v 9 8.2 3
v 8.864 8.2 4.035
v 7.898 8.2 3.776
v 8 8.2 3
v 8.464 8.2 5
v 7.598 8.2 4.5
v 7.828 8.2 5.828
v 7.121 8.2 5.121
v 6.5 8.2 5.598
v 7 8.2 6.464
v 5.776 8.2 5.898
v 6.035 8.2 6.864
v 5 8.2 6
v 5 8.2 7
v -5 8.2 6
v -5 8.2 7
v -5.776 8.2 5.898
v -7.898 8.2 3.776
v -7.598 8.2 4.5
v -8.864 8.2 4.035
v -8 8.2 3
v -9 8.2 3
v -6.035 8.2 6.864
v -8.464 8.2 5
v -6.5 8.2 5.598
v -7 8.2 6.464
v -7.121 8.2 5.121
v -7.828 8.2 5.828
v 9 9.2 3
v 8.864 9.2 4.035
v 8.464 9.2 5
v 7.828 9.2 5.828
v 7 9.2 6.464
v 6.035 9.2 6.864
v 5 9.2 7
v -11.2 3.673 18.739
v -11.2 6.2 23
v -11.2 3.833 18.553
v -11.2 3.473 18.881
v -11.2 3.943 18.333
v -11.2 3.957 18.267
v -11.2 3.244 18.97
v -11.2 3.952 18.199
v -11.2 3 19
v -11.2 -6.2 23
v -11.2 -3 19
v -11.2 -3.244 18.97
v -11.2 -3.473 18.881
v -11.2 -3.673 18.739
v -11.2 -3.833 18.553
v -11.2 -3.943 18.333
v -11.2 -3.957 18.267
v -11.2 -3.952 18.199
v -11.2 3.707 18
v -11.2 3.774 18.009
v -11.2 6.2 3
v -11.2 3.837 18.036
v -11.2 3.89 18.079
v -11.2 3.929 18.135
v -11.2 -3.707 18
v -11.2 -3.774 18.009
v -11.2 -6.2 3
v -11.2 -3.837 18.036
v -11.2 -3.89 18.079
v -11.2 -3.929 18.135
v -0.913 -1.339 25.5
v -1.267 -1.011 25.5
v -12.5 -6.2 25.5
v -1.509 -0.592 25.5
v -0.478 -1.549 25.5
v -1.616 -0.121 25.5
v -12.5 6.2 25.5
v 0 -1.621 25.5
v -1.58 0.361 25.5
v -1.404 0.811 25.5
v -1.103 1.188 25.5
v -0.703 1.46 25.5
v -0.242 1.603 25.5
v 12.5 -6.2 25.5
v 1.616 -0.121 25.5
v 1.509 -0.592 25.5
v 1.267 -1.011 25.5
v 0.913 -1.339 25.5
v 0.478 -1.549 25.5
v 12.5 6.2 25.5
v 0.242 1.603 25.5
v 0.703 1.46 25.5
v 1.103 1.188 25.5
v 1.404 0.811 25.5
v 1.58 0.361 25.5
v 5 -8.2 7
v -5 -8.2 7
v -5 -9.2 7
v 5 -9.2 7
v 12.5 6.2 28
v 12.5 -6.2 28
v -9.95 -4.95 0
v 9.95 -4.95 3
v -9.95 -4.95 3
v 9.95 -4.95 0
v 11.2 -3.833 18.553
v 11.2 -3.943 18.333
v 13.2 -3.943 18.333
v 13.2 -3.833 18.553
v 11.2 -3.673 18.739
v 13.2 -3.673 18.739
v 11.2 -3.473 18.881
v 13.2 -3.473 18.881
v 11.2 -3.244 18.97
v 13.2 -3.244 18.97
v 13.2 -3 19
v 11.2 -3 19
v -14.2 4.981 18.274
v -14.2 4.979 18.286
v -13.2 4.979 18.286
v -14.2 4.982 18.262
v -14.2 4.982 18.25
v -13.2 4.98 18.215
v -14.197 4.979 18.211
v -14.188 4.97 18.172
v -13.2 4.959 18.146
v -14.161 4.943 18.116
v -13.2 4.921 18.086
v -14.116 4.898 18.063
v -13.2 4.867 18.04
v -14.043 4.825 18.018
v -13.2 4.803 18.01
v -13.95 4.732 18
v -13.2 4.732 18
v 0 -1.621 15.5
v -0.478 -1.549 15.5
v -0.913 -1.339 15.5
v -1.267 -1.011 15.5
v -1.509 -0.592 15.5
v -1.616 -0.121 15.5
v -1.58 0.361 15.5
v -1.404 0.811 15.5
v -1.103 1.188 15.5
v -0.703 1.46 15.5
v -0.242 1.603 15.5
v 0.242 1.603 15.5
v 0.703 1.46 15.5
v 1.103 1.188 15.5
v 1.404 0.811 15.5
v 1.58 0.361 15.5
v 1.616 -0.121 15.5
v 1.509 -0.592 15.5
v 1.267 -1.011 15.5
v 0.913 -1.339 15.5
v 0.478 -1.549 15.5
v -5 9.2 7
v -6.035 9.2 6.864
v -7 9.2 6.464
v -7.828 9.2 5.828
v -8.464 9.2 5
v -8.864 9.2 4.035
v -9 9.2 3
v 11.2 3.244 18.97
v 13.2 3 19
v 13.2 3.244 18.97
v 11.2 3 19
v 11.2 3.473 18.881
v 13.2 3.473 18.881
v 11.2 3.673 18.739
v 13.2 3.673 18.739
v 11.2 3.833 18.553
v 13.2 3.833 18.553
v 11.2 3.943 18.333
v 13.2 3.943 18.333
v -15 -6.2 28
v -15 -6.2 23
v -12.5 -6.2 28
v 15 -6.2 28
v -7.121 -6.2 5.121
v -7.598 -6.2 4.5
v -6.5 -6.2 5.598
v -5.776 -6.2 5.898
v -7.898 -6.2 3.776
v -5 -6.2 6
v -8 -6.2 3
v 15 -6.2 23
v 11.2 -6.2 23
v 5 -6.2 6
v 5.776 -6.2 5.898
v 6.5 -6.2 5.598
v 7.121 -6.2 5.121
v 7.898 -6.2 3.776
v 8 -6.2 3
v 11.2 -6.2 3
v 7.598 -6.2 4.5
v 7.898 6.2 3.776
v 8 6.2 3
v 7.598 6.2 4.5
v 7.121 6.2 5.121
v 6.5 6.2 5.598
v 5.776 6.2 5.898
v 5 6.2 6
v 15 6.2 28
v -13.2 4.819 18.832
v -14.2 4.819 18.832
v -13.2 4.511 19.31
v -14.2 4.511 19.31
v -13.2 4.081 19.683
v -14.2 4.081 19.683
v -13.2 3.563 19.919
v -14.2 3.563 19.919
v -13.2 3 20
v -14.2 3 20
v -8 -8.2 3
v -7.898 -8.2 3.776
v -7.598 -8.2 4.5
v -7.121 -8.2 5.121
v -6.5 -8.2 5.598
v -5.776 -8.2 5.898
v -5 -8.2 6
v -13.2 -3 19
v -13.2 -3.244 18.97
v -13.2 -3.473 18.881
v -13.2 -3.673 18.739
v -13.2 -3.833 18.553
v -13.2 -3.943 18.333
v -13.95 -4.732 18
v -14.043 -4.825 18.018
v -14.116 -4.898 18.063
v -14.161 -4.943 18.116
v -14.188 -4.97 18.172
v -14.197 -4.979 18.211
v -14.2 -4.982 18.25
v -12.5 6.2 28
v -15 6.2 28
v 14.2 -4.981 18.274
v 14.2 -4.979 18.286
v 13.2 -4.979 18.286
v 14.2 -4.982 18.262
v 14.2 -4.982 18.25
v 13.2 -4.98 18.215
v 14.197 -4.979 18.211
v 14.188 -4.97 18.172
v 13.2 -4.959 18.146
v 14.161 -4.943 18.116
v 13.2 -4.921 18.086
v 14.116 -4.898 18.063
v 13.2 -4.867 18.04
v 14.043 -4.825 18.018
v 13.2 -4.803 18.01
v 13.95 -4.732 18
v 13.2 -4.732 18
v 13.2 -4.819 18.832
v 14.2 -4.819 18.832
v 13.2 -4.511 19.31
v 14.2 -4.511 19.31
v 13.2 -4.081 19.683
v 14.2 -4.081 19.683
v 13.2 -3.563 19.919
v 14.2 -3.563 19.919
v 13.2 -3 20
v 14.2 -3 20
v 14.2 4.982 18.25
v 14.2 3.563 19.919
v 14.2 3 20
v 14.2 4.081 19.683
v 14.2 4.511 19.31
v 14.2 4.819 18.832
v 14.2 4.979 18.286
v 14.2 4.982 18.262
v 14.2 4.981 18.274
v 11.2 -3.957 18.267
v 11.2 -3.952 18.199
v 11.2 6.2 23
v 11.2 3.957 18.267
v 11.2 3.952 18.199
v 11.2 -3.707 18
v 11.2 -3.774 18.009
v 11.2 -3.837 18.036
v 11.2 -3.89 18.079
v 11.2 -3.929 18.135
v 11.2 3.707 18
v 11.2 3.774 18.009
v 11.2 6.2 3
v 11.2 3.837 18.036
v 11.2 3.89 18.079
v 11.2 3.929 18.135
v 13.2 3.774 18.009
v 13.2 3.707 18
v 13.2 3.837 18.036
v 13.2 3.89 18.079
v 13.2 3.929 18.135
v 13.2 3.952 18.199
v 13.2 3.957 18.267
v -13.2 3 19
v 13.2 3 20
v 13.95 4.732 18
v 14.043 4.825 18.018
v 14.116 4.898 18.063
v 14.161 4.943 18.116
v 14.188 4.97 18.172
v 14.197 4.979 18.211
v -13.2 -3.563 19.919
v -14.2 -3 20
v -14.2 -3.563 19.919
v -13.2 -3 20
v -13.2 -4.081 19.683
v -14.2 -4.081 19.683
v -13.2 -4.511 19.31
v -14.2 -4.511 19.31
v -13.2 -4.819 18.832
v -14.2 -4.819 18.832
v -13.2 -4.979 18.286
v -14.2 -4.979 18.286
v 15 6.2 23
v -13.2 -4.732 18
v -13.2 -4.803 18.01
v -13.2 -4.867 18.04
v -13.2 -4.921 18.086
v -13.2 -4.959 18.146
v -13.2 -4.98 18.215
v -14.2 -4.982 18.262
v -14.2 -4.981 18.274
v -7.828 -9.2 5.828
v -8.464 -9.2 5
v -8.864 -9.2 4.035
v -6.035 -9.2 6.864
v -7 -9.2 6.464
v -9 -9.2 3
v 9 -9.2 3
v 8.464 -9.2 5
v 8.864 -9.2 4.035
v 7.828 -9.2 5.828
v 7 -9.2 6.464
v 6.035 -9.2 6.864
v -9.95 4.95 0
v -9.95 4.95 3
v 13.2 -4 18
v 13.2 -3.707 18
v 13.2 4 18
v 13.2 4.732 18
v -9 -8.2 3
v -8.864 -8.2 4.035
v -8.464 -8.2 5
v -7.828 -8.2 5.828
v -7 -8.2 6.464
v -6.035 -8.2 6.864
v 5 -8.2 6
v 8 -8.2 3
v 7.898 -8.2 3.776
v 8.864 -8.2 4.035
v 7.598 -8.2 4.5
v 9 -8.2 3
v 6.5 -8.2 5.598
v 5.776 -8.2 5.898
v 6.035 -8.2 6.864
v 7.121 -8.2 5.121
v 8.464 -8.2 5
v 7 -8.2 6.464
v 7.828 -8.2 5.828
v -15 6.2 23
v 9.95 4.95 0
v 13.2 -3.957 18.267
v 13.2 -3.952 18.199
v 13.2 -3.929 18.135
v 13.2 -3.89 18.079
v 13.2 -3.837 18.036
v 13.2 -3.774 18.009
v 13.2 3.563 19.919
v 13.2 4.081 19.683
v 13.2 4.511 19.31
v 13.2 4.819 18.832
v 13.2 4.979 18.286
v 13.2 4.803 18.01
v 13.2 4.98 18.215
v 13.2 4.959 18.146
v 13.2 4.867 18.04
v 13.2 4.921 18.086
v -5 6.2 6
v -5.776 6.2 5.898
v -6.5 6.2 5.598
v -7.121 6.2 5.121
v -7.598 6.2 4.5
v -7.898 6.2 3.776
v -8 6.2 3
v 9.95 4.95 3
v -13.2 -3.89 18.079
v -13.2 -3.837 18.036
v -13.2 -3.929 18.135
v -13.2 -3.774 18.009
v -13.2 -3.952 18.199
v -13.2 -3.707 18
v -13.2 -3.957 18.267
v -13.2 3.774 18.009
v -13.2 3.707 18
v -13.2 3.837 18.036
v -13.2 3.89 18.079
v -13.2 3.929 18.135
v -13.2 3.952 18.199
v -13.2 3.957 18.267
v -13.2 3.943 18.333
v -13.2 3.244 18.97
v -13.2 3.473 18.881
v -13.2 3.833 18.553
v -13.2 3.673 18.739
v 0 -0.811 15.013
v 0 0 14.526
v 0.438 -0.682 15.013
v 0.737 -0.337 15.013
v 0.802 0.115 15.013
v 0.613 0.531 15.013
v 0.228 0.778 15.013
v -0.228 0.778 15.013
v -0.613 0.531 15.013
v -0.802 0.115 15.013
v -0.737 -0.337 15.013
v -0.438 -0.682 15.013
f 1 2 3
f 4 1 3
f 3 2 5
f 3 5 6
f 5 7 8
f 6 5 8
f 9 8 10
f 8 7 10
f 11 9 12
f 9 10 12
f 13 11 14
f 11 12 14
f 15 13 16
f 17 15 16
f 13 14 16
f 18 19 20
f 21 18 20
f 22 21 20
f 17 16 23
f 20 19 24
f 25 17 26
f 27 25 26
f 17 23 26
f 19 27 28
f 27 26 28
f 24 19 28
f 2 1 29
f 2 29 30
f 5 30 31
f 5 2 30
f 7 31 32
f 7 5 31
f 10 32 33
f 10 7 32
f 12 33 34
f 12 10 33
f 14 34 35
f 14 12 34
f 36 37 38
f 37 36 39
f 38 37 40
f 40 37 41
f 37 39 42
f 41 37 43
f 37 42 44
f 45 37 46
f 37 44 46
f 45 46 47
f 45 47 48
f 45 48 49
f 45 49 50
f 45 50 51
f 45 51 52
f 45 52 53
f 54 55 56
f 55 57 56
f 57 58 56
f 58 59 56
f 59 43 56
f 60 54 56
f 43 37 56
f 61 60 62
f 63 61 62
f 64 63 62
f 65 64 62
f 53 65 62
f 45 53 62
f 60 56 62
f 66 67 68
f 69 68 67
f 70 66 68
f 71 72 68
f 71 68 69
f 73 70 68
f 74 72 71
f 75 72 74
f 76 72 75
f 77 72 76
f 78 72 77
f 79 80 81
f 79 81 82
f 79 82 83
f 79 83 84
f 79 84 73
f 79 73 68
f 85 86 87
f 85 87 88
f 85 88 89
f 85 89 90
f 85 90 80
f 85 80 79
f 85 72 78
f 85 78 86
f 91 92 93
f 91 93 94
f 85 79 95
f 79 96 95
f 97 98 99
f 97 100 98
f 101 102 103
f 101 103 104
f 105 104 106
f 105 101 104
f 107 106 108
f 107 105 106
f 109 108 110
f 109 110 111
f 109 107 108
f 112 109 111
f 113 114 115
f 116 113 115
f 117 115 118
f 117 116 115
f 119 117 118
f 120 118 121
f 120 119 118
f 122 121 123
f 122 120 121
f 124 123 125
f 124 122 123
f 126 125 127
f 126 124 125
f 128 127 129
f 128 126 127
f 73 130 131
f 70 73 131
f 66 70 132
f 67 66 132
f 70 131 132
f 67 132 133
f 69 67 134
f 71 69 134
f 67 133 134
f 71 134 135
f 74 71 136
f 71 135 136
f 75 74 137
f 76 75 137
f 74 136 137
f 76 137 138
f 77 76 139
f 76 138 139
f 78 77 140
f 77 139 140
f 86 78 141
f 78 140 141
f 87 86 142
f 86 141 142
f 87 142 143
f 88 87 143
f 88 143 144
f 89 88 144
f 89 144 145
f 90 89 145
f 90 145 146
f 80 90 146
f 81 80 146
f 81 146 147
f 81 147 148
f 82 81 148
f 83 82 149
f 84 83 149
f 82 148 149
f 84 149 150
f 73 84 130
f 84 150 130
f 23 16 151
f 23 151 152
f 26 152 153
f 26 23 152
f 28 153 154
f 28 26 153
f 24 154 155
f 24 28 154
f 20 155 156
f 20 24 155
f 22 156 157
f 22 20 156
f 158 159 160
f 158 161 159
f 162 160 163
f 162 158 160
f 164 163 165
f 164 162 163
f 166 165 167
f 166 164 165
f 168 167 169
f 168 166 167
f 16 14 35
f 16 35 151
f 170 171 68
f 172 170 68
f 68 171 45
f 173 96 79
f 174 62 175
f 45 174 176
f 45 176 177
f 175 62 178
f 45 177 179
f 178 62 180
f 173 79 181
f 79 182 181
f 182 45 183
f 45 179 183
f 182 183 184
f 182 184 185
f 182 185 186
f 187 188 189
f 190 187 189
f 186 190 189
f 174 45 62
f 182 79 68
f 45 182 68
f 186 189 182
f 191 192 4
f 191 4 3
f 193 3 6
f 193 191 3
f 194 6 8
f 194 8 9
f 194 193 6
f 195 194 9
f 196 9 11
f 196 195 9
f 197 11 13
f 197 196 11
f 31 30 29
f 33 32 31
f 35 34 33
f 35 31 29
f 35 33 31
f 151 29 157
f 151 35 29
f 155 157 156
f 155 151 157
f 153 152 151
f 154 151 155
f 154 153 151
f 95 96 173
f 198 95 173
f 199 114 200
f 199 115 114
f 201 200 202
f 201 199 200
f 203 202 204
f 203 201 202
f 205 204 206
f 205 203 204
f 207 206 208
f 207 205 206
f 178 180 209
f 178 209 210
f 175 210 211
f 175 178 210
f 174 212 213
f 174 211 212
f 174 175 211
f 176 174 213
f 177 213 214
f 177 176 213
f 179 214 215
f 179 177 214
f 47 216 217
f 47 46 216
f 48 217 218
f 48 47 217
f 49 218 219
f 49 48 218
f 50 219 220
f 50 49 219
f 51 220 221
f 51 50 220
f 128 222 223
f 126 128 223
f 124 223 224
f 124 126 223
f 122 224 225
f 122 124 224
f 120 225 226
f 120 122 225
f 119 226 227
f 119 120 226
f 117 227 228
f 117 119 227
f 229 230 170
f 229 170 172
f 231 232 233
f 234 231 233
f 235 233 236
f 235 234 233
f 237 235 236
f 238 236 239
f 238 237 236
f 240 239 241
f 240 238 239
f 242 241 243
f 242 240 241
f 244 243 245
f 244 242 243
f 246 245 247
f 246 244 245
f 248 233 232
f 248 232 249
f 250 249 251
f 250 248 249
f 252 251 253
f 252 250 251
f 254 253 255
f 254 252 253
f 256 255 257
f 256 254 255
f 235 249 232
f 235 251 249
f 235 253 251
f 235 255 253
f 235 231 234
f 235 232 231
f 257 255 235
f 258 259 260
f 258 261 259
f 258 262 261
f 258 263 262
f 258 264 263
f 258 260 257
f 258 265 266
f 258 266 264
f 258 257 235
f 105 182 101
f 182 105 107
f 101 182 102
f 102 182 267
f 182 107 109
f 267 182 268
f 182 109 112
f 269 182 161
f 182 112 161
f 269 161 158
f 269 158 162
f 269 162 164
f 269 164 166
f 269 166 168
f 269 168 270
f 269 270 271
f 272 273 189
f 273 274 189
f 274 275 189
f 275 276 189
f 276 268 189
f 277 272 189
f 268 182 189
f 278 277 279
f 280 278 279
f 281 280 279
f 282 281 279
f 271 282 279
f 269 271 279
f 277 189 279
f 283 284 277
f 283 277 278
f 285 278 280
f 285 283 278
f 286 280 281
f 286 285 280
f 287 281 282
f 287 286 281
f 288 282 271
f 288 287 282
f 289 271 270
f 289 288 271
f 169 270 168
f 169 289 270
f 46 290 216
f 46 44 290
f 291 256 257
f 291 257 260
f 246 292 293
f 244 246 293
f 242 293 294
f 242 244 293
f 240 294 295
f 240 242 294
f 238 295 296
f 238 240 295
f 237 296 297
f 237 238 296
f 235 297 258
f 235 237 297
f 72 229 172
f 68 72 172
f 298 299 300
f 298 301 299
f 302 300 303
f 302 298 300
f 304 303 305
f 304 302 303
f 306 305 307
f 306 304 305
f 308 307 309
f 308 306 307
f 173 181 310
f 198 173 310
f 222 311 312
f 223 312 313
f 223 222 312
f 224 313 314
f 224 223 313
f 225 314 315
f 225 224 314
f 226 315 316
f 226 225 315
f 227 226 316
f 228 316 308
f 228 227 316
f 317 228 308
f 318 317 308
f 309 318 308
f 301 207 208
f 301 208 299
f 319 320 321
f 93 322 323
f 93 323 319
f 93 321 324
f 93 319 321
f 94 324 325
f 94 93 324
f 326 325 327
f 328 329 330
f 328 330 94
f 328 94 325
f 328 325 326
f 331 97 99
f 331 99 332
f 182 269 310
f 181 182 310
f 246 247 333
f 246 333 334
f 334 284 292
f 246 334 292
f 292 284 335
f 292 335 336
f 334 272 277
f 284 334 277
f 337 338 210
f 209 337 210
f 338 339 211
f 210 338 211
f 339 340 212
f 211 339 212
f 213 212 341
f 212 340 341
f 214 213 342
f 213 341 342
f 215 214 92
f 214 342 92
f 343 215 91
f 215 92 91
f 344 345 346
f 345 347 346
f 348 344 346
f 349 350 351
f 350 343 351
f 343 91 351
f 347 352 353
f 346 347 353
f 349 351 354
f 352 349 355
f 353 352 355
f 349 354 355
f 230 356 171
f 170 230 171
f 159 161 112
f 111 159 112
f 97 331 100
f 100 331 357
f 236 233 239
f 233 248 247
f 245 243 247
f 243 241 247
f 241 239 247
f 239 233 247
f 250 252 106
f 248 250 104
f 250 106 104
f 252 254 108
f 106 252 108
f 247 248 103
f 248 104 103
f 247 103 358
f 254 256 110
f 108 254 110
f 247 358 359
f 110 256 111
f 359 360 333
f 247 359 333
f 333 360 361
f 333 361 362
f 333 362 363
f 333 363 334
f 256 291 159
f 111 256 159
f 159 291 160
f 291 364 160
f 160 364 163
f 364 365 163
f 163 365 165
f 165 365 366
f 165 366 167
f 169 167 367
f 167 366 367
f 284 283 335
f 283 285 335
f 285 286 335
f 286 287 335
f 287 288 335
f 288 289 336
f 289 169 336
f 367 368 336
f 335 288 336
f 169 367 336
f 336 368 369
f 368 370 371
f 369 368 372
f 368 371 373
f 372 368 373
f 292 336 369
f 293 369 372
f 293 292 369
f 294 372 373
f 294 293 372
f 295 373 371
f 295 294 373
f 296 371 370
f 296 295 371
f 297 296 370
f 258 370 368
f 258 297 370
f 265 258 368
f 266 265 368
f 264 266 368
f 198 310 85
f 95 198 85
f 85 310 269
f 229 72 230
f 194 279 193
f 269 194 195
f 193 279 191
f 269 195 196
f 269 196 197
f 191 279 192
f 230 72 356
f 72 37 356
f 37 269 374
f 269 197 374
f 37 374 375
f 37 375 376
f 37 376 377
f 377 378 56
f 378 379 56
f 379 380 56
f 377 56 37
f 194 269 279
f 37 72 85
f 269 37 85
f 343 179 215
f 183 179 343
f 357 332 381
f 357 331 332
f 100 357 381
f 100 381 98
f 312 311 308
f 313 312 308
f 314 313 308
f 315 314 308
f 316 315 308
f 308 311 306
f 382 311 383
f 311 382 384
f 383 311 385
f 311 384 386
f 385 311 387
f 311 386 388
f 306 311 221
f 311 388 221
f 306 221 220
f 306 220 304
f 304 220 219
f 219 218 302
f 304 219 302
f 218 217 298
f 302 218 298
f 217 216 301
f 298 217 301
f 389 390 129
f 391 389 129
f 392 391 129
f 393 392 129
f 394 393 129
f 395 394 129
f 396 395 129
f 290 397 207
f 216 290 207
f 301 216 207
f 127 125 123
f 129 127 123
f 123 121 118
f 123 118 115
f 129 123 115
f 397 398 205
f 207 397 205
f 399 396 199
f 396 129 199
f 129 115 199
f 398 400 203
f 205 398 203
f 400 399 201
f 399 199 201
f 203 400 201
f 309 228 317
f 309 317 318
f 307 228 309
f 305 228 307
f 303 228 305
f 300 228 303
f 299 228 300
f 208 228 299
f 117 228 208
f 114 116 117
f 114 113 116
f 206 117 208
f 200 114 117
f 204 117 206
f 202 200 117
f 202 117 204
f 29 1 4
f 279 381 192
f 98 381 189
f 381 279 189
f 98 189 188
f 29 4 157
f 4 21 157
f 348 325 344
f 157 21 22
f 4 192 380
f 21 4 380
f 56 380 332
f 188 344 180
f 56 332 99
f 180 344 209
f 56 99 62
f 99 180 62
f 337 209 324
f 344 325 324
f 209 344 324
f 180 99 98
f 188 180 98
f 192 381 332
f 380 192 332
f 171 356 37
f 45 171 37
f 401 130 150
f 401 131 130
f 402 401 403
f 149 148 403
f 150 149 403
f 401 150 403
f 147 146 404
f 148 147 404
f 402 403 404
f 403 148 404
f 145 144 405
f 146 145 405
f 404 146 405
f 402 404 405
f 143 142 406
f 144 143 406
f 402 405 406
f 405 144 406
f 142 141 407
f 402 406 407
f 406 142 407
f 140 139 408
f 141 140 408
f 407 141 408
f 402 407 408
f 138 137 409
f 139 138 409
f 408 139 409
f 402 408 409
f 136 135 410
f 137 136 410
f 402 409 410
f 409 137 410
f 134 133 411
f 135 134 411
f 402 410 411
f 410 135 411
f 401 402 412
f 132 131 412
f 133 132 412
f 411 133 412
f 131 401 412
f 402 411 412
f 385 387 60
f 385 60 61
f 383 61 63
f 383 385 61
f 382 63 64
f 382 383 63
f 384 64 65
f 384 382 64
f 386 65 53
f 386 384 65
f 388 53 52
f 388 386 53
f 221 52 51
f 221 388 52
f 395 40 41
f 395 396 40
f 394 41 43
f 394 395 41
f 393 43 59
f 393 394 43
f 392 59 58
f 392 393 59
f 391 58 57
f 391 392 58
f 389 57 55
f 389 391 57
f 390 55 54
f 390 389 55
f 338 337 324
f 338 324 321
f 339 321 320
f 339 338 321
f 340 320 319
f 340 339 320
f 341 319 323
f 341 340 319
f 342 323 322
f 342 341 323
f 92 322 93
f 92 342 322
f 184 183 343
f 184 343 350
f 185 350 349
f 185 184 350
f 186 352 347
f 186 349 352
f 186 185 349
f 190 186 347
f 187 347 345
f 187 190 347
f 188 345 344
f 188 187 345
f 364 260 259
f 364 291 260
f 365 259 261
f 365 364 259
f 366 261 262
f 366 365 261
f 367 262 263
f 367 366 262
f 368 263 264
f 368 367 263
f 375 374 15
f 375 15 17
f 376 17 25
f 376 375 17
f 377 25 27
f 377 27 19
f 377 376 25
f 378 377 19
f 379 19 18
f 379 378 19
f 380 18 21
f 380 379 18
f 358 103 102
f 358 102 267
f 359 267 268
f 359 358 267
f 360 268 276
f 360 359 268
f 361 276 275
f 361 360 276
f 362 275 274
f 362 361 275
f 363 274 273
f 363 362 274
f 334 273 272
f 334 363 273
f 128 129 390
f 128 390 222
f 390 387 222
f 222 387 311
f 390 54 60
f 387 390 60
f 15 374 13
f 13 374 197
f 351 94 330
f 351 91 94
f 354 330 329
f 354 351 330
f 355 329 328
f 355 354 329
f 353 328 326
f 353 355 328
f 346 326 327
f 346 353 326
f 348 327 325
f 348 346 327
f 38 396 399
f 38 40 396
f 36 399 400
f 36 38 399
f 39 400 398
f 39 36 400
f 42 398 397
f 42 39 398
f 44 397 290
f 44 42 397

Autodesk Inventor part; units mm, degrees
ref_plane "YZ Plane" through (0, 0, 0) normal (1, 0, 0) x (0, 1, 0)
sketch "Sketch1" plane through (0, 0, 0) normal (0, 0, 1) x (1, 0, 0)
  line L0 (0, 6.93) -> (0, -6.93) construction
  line L1 (-13.93, 0) -> (13.93, 0) construction
  line L2 (-9.95, 4.95) -> (9.95, 4.95)
  line L3 (9.95, 4.95) -> (9.95, -4.95)
  line L4 (9.95, -4.95) -> (-9.95, -4.95)
  line L5 (-9.95, -4.95) -> (-9.95, 4.95)
  point P0 (0, 0)
  dimension "d0" = 9.9
  dimension "d1" = 19.9
extrude "Extrusion1" add sketch "Sketch1" along normal blind 3
sketch "Sketch2" plane through (0, 0, 3) normal (0, 0, 1) x (1, 0, 0)
  line L0 (9.95, 4.95) -> (-9.95, 4.95) construction
  line L1 (-9.95, 4.95) -> (-9.95, -4.95) construction
  line L2 (-9.95, -4.95) -> (9.95, -4.95) construction
  line L3 (9.95, -4.95) -> (9.95, 4.95) construction
  line L4 (11.2, 6.2) -> (-11.2, 6.2)
  line L5 (-11.2, 6.2) -> (-11.2, -6.2)
  line L6 (-11.2, -6.2) -> (11.2, -6.2)
  line L7 (11.2, -6.2) -> (11.2, 6.2)
  point P0 (0, 0)
  dimension "d" = 1.25
  dimension "d5" = 1.25
  dimension "d6" = 1.25
  dimension "d7" = 1.25
extrude "Extrusion2" add sketch "Sketch2" along normal blind 20
sketch "Sketch3" plane through (0, 0, 23) normal (0, 0, 1) x (1, 0, 0)
  line L0 (11.2, 6.2) -> (-11.2, 6.2) construction
  line L1 (-11.2, 6.2) -> (-11.2, -6.2) construction
  line L2 (-11.2, -6.2) -> (11.2, -6.2) construction
  line L3 (11.2, -6.2) -> (11.2, 6.2) construction
  line L4 (0, 8.68) -> (0, -8.68) construction
  line L5 (-21, 0) -> (21, 0) construction
  line L6 (15, 6.2) -> (-15, 6.2)
  line L7 (-15, 6.2) -> (-15, -6.2)
  line L8 (-15, -6.2) -> (15, -6.2)
  line L9 (15, -6.2) -> (15, 6.2)
  point P0 (0, 0)
  dimension "d10" = 30
extrude "Extrusion3" add sketch "Sketch3" along normal blind 5
sketch "Sketch4" plane through (0, 0, 28) normal (0, 0, 1) x (1, 0, 0)
  line L0 (0, 17.5) -> (0, -17.5) construction
  line L1 (-21, 0) -> (21, 0) construction
  line L2 (15, 6.2) -> (-15, 6.2) construction
  line L3 (-15, 6.2) -> (-15, -6.2) construction
  line L4 (-15, -6.2) -> (15, -6.2) construction
  line L5 (15, -6.2) -> (15, 6.2) construction
  line L6 (12.5, 12.5) -> (-12.5, 12.5)
  line L7 (-12.5, 12.5) -> (-12.5, -12.5)
  line L8 (-12.5, -12.5) -> (12.5, -12.5)
  line L9 (12.5, -12.5) -> (12.5, 12.5)
  point P0 (0, 0)
  dimension "d13" = 25
  dimension "d14" = 25
extrude "Extrusion4" cut sketch "Sketch4" against normal blind 2.5
sketch "Sketch5" plane through (0, 0, 25.5) normal (0, 0, 1) x (1, 0, 0)
  point P0 (0, 0)
  point P1 (0, 0)
hole "Hole1" at (0, 0, 25.5) direction (0, 0, -1) diameter 3.242 depth 10 tip angle 118 thread size "M4x0.7" class "6H" standard "ANSI Metric M Profile"
sketch "Sketch6" plane through (-11.2, -6.2, 3) normal (0, -1, 0) x (1, 0, 0)
  line L0 (-1.3, 22.5) -> (-1.3, 25) construction
  line L1 (-3.8, 25) -> (-1.3, 25) construction
  line L2 (-3.8, 20) -> (-3.8, 25) construction
  line L3 (-3.8, 20) -> (0, 20) construction
  line L4 (0, 0) -> (0, 20) construction
  line L5 (0, 0) -> (22.4, 0) construction
  line L6 (22.4, 0) -> (22.4, 20) construction
  line L7 (22.4, 20) -> (26.2, 20) construction
  line L8 (26.2, 20) -> (26.2, 25) construction
  line L9 (23.7, 25) -> (26.2, 25) construction
  line L10 (23.7, 25) -> (23.7, 22.5) construction
  line L11 (23.7, 22.5) -> (-1.3, 22.5) construction
  line L12 (11.2, 30.6) -> (11.2, -8.6) construction
  line L13 (0, 0) -> (22.4, 0) projected
  line L14 (3.2, 0) -> (11.2, 0)
  arc A0 (6.2, 3) -> (3.2, 0) centre (6.2, 0) ccw
  line L15 (6.2, 3) -> (11.2, 3)
  line L16 (19.2, 0) -> (11.2, 0)
  arc A1 (19.2, 0) -> (16.2, 3) centre (16.2, 0) ccw
  line L17 (16.2, 3) -> (11.2, 3)
  point P0 (11.2, -3)
  dimension "d24" = 8
  dimension "r" = 3
  dimension "d28" = 3
extrude "Extrusion5" add sketch "Sketch6" along normal blind 2
sketch "Sketch7" plane through (-11.2, -8.2, 3) normal (0, -1, 0) x (1, 0, 0)
  line L0 (3.2, 0) -> (19.2, 0) construction
  arc A0 (19.2, 0) -> (16.2, 3) centre (16.2, 0) ccw construction
  line L1 (16.2, 3) -> (6.2, 3) construction
  arc A1 (6.2, 3) -> (3.2, 0) centre (6.2, 0) ccw construction
  line L2 (2.2, 0) -> (20.2, 0) construction
  arc A2 (6.2, 4) -> (2.2, 0) centre (6.2, 0) ccw
  arc A3 (20.2, 0) -> (16.2, 4) centre (16.2, 0) ccw
  line L3 (6.2, 4) -> (16.2, 4)
  line L4 (2.2, 0) -> (20.2, 0)
  point P0 (11.2, -3)
  dimension "d33" = 1
  dimension "a" = 1
extrude "Extrusion6" add sketch "Sketch7" along normal blind 1
ref_plane "Work Plane1" through (11.2, 0, 23) normal (0, -1, 0) x (1, 0, 0)
ref_plane "Work Plane2" through (0, -6.2, 3) normal (-1, 0, 0) x (0, 0, 1)
mirror "Mirror1" about plane through (11.2, 0, 23) normal (0, -1, 0) of "Extrusion5", "Extrusion6"
sketch "Sketch8" plane through (-11.2, -6.2, 3) normal (-1, 0, 0) x (0, 0, 1)
  line L0 (0, 12.4) -> (0, 0) construction
  line L1 (0, 0) -> (20, 0) construction
  line L2 (20, 12.4) -> (20, 0) construction
  line L3 (0, 12.4) -> (20, 12.4) construction
  line L4 (30.6, 6.2) -> (-8.6, 6.2) construction
  line L5 (15, 10.2) -> (15, 6.2)
  arc A0 (16, 9.2) -> (15, 10.2) centre (15, 9.2) ccw
  line L6 (15, 9.2) -> (16, 9.2) construction
  line L7 (15, 9.2) -> (15, 10.2) construction
  line L8 (16, 9.2) -> (16, 6.2)
  line L9 (15, 2.2) -> (15, 6.2)
  arc A1 (15, 2.2) -> (16, 3.2) centre (15, 3.2) ccw
  line L10 (16, 3.2) -> (16, 6.2)
  point P0 (-3, 6.2)
  dimension "d37" = 4
  dimension "d38" = 90
  dimension "radius" = 1
  dimension "d40" = 15
extrude "Extrusion7" add sketch "Sketch8" along normal blind 2
sketch "Sketch9" plane through (-13.2, -6.2, 3) normal (-1, 0, 0) x (0, 0, 1)
  line L0 (15, 10.2) -> (15, 2.2) construction
  arc A0 (15, 2.2) -> (16, 3.2) centre (15, 3.2) ccw construction
  line L1 (16, 3.2) -> (16, 9.2) construction
  arc A1 (16, 9.2) -> (15, 10.2) centre (15, 9.2) ccw construction
  line L2 (15, 11.2) -> (15, 1.2)
  arc A2 (17, 9.2) -> (15, 11.2) centre (15, 9.2) ccw
  arc A3 (15, 1.2) -> (17, 3.2) centre (15, 3.2) ccw
  line L3 (17, 9.2) -> (17, 3.2)
  line L4 (15, 10.2) -> (15, 2.2) projected
  point P0 (-3, 6.2)
  dimension "d44" = 1
  dimension "d45" = 1
  dimension "d46" = 90
extrude "Extrusion8" add sketch "Sketch9" along normal blind 1
fillet "Fillet1" radius 0.25 5 edges at (-12.2, 4, 18) (-13.7, 5, 18) (-13.7, -5, 18) (-12.2, -4, 18) (-14.2, 0, 18)
mirror "Mirror2" about plane through (0, -6.2, 3) normal (-1, 0, 0) of "Extrusion7", "Extrusion8", "Fillet1"
equation "\"d5\" = d"
equation "\"d6\" = d"
equation "\"d7\" = d"
equation "\"d28\" = r"
equation "\"d33\" = a"
properties part number "Sample-cuvette-clamp-20mm-V4"
